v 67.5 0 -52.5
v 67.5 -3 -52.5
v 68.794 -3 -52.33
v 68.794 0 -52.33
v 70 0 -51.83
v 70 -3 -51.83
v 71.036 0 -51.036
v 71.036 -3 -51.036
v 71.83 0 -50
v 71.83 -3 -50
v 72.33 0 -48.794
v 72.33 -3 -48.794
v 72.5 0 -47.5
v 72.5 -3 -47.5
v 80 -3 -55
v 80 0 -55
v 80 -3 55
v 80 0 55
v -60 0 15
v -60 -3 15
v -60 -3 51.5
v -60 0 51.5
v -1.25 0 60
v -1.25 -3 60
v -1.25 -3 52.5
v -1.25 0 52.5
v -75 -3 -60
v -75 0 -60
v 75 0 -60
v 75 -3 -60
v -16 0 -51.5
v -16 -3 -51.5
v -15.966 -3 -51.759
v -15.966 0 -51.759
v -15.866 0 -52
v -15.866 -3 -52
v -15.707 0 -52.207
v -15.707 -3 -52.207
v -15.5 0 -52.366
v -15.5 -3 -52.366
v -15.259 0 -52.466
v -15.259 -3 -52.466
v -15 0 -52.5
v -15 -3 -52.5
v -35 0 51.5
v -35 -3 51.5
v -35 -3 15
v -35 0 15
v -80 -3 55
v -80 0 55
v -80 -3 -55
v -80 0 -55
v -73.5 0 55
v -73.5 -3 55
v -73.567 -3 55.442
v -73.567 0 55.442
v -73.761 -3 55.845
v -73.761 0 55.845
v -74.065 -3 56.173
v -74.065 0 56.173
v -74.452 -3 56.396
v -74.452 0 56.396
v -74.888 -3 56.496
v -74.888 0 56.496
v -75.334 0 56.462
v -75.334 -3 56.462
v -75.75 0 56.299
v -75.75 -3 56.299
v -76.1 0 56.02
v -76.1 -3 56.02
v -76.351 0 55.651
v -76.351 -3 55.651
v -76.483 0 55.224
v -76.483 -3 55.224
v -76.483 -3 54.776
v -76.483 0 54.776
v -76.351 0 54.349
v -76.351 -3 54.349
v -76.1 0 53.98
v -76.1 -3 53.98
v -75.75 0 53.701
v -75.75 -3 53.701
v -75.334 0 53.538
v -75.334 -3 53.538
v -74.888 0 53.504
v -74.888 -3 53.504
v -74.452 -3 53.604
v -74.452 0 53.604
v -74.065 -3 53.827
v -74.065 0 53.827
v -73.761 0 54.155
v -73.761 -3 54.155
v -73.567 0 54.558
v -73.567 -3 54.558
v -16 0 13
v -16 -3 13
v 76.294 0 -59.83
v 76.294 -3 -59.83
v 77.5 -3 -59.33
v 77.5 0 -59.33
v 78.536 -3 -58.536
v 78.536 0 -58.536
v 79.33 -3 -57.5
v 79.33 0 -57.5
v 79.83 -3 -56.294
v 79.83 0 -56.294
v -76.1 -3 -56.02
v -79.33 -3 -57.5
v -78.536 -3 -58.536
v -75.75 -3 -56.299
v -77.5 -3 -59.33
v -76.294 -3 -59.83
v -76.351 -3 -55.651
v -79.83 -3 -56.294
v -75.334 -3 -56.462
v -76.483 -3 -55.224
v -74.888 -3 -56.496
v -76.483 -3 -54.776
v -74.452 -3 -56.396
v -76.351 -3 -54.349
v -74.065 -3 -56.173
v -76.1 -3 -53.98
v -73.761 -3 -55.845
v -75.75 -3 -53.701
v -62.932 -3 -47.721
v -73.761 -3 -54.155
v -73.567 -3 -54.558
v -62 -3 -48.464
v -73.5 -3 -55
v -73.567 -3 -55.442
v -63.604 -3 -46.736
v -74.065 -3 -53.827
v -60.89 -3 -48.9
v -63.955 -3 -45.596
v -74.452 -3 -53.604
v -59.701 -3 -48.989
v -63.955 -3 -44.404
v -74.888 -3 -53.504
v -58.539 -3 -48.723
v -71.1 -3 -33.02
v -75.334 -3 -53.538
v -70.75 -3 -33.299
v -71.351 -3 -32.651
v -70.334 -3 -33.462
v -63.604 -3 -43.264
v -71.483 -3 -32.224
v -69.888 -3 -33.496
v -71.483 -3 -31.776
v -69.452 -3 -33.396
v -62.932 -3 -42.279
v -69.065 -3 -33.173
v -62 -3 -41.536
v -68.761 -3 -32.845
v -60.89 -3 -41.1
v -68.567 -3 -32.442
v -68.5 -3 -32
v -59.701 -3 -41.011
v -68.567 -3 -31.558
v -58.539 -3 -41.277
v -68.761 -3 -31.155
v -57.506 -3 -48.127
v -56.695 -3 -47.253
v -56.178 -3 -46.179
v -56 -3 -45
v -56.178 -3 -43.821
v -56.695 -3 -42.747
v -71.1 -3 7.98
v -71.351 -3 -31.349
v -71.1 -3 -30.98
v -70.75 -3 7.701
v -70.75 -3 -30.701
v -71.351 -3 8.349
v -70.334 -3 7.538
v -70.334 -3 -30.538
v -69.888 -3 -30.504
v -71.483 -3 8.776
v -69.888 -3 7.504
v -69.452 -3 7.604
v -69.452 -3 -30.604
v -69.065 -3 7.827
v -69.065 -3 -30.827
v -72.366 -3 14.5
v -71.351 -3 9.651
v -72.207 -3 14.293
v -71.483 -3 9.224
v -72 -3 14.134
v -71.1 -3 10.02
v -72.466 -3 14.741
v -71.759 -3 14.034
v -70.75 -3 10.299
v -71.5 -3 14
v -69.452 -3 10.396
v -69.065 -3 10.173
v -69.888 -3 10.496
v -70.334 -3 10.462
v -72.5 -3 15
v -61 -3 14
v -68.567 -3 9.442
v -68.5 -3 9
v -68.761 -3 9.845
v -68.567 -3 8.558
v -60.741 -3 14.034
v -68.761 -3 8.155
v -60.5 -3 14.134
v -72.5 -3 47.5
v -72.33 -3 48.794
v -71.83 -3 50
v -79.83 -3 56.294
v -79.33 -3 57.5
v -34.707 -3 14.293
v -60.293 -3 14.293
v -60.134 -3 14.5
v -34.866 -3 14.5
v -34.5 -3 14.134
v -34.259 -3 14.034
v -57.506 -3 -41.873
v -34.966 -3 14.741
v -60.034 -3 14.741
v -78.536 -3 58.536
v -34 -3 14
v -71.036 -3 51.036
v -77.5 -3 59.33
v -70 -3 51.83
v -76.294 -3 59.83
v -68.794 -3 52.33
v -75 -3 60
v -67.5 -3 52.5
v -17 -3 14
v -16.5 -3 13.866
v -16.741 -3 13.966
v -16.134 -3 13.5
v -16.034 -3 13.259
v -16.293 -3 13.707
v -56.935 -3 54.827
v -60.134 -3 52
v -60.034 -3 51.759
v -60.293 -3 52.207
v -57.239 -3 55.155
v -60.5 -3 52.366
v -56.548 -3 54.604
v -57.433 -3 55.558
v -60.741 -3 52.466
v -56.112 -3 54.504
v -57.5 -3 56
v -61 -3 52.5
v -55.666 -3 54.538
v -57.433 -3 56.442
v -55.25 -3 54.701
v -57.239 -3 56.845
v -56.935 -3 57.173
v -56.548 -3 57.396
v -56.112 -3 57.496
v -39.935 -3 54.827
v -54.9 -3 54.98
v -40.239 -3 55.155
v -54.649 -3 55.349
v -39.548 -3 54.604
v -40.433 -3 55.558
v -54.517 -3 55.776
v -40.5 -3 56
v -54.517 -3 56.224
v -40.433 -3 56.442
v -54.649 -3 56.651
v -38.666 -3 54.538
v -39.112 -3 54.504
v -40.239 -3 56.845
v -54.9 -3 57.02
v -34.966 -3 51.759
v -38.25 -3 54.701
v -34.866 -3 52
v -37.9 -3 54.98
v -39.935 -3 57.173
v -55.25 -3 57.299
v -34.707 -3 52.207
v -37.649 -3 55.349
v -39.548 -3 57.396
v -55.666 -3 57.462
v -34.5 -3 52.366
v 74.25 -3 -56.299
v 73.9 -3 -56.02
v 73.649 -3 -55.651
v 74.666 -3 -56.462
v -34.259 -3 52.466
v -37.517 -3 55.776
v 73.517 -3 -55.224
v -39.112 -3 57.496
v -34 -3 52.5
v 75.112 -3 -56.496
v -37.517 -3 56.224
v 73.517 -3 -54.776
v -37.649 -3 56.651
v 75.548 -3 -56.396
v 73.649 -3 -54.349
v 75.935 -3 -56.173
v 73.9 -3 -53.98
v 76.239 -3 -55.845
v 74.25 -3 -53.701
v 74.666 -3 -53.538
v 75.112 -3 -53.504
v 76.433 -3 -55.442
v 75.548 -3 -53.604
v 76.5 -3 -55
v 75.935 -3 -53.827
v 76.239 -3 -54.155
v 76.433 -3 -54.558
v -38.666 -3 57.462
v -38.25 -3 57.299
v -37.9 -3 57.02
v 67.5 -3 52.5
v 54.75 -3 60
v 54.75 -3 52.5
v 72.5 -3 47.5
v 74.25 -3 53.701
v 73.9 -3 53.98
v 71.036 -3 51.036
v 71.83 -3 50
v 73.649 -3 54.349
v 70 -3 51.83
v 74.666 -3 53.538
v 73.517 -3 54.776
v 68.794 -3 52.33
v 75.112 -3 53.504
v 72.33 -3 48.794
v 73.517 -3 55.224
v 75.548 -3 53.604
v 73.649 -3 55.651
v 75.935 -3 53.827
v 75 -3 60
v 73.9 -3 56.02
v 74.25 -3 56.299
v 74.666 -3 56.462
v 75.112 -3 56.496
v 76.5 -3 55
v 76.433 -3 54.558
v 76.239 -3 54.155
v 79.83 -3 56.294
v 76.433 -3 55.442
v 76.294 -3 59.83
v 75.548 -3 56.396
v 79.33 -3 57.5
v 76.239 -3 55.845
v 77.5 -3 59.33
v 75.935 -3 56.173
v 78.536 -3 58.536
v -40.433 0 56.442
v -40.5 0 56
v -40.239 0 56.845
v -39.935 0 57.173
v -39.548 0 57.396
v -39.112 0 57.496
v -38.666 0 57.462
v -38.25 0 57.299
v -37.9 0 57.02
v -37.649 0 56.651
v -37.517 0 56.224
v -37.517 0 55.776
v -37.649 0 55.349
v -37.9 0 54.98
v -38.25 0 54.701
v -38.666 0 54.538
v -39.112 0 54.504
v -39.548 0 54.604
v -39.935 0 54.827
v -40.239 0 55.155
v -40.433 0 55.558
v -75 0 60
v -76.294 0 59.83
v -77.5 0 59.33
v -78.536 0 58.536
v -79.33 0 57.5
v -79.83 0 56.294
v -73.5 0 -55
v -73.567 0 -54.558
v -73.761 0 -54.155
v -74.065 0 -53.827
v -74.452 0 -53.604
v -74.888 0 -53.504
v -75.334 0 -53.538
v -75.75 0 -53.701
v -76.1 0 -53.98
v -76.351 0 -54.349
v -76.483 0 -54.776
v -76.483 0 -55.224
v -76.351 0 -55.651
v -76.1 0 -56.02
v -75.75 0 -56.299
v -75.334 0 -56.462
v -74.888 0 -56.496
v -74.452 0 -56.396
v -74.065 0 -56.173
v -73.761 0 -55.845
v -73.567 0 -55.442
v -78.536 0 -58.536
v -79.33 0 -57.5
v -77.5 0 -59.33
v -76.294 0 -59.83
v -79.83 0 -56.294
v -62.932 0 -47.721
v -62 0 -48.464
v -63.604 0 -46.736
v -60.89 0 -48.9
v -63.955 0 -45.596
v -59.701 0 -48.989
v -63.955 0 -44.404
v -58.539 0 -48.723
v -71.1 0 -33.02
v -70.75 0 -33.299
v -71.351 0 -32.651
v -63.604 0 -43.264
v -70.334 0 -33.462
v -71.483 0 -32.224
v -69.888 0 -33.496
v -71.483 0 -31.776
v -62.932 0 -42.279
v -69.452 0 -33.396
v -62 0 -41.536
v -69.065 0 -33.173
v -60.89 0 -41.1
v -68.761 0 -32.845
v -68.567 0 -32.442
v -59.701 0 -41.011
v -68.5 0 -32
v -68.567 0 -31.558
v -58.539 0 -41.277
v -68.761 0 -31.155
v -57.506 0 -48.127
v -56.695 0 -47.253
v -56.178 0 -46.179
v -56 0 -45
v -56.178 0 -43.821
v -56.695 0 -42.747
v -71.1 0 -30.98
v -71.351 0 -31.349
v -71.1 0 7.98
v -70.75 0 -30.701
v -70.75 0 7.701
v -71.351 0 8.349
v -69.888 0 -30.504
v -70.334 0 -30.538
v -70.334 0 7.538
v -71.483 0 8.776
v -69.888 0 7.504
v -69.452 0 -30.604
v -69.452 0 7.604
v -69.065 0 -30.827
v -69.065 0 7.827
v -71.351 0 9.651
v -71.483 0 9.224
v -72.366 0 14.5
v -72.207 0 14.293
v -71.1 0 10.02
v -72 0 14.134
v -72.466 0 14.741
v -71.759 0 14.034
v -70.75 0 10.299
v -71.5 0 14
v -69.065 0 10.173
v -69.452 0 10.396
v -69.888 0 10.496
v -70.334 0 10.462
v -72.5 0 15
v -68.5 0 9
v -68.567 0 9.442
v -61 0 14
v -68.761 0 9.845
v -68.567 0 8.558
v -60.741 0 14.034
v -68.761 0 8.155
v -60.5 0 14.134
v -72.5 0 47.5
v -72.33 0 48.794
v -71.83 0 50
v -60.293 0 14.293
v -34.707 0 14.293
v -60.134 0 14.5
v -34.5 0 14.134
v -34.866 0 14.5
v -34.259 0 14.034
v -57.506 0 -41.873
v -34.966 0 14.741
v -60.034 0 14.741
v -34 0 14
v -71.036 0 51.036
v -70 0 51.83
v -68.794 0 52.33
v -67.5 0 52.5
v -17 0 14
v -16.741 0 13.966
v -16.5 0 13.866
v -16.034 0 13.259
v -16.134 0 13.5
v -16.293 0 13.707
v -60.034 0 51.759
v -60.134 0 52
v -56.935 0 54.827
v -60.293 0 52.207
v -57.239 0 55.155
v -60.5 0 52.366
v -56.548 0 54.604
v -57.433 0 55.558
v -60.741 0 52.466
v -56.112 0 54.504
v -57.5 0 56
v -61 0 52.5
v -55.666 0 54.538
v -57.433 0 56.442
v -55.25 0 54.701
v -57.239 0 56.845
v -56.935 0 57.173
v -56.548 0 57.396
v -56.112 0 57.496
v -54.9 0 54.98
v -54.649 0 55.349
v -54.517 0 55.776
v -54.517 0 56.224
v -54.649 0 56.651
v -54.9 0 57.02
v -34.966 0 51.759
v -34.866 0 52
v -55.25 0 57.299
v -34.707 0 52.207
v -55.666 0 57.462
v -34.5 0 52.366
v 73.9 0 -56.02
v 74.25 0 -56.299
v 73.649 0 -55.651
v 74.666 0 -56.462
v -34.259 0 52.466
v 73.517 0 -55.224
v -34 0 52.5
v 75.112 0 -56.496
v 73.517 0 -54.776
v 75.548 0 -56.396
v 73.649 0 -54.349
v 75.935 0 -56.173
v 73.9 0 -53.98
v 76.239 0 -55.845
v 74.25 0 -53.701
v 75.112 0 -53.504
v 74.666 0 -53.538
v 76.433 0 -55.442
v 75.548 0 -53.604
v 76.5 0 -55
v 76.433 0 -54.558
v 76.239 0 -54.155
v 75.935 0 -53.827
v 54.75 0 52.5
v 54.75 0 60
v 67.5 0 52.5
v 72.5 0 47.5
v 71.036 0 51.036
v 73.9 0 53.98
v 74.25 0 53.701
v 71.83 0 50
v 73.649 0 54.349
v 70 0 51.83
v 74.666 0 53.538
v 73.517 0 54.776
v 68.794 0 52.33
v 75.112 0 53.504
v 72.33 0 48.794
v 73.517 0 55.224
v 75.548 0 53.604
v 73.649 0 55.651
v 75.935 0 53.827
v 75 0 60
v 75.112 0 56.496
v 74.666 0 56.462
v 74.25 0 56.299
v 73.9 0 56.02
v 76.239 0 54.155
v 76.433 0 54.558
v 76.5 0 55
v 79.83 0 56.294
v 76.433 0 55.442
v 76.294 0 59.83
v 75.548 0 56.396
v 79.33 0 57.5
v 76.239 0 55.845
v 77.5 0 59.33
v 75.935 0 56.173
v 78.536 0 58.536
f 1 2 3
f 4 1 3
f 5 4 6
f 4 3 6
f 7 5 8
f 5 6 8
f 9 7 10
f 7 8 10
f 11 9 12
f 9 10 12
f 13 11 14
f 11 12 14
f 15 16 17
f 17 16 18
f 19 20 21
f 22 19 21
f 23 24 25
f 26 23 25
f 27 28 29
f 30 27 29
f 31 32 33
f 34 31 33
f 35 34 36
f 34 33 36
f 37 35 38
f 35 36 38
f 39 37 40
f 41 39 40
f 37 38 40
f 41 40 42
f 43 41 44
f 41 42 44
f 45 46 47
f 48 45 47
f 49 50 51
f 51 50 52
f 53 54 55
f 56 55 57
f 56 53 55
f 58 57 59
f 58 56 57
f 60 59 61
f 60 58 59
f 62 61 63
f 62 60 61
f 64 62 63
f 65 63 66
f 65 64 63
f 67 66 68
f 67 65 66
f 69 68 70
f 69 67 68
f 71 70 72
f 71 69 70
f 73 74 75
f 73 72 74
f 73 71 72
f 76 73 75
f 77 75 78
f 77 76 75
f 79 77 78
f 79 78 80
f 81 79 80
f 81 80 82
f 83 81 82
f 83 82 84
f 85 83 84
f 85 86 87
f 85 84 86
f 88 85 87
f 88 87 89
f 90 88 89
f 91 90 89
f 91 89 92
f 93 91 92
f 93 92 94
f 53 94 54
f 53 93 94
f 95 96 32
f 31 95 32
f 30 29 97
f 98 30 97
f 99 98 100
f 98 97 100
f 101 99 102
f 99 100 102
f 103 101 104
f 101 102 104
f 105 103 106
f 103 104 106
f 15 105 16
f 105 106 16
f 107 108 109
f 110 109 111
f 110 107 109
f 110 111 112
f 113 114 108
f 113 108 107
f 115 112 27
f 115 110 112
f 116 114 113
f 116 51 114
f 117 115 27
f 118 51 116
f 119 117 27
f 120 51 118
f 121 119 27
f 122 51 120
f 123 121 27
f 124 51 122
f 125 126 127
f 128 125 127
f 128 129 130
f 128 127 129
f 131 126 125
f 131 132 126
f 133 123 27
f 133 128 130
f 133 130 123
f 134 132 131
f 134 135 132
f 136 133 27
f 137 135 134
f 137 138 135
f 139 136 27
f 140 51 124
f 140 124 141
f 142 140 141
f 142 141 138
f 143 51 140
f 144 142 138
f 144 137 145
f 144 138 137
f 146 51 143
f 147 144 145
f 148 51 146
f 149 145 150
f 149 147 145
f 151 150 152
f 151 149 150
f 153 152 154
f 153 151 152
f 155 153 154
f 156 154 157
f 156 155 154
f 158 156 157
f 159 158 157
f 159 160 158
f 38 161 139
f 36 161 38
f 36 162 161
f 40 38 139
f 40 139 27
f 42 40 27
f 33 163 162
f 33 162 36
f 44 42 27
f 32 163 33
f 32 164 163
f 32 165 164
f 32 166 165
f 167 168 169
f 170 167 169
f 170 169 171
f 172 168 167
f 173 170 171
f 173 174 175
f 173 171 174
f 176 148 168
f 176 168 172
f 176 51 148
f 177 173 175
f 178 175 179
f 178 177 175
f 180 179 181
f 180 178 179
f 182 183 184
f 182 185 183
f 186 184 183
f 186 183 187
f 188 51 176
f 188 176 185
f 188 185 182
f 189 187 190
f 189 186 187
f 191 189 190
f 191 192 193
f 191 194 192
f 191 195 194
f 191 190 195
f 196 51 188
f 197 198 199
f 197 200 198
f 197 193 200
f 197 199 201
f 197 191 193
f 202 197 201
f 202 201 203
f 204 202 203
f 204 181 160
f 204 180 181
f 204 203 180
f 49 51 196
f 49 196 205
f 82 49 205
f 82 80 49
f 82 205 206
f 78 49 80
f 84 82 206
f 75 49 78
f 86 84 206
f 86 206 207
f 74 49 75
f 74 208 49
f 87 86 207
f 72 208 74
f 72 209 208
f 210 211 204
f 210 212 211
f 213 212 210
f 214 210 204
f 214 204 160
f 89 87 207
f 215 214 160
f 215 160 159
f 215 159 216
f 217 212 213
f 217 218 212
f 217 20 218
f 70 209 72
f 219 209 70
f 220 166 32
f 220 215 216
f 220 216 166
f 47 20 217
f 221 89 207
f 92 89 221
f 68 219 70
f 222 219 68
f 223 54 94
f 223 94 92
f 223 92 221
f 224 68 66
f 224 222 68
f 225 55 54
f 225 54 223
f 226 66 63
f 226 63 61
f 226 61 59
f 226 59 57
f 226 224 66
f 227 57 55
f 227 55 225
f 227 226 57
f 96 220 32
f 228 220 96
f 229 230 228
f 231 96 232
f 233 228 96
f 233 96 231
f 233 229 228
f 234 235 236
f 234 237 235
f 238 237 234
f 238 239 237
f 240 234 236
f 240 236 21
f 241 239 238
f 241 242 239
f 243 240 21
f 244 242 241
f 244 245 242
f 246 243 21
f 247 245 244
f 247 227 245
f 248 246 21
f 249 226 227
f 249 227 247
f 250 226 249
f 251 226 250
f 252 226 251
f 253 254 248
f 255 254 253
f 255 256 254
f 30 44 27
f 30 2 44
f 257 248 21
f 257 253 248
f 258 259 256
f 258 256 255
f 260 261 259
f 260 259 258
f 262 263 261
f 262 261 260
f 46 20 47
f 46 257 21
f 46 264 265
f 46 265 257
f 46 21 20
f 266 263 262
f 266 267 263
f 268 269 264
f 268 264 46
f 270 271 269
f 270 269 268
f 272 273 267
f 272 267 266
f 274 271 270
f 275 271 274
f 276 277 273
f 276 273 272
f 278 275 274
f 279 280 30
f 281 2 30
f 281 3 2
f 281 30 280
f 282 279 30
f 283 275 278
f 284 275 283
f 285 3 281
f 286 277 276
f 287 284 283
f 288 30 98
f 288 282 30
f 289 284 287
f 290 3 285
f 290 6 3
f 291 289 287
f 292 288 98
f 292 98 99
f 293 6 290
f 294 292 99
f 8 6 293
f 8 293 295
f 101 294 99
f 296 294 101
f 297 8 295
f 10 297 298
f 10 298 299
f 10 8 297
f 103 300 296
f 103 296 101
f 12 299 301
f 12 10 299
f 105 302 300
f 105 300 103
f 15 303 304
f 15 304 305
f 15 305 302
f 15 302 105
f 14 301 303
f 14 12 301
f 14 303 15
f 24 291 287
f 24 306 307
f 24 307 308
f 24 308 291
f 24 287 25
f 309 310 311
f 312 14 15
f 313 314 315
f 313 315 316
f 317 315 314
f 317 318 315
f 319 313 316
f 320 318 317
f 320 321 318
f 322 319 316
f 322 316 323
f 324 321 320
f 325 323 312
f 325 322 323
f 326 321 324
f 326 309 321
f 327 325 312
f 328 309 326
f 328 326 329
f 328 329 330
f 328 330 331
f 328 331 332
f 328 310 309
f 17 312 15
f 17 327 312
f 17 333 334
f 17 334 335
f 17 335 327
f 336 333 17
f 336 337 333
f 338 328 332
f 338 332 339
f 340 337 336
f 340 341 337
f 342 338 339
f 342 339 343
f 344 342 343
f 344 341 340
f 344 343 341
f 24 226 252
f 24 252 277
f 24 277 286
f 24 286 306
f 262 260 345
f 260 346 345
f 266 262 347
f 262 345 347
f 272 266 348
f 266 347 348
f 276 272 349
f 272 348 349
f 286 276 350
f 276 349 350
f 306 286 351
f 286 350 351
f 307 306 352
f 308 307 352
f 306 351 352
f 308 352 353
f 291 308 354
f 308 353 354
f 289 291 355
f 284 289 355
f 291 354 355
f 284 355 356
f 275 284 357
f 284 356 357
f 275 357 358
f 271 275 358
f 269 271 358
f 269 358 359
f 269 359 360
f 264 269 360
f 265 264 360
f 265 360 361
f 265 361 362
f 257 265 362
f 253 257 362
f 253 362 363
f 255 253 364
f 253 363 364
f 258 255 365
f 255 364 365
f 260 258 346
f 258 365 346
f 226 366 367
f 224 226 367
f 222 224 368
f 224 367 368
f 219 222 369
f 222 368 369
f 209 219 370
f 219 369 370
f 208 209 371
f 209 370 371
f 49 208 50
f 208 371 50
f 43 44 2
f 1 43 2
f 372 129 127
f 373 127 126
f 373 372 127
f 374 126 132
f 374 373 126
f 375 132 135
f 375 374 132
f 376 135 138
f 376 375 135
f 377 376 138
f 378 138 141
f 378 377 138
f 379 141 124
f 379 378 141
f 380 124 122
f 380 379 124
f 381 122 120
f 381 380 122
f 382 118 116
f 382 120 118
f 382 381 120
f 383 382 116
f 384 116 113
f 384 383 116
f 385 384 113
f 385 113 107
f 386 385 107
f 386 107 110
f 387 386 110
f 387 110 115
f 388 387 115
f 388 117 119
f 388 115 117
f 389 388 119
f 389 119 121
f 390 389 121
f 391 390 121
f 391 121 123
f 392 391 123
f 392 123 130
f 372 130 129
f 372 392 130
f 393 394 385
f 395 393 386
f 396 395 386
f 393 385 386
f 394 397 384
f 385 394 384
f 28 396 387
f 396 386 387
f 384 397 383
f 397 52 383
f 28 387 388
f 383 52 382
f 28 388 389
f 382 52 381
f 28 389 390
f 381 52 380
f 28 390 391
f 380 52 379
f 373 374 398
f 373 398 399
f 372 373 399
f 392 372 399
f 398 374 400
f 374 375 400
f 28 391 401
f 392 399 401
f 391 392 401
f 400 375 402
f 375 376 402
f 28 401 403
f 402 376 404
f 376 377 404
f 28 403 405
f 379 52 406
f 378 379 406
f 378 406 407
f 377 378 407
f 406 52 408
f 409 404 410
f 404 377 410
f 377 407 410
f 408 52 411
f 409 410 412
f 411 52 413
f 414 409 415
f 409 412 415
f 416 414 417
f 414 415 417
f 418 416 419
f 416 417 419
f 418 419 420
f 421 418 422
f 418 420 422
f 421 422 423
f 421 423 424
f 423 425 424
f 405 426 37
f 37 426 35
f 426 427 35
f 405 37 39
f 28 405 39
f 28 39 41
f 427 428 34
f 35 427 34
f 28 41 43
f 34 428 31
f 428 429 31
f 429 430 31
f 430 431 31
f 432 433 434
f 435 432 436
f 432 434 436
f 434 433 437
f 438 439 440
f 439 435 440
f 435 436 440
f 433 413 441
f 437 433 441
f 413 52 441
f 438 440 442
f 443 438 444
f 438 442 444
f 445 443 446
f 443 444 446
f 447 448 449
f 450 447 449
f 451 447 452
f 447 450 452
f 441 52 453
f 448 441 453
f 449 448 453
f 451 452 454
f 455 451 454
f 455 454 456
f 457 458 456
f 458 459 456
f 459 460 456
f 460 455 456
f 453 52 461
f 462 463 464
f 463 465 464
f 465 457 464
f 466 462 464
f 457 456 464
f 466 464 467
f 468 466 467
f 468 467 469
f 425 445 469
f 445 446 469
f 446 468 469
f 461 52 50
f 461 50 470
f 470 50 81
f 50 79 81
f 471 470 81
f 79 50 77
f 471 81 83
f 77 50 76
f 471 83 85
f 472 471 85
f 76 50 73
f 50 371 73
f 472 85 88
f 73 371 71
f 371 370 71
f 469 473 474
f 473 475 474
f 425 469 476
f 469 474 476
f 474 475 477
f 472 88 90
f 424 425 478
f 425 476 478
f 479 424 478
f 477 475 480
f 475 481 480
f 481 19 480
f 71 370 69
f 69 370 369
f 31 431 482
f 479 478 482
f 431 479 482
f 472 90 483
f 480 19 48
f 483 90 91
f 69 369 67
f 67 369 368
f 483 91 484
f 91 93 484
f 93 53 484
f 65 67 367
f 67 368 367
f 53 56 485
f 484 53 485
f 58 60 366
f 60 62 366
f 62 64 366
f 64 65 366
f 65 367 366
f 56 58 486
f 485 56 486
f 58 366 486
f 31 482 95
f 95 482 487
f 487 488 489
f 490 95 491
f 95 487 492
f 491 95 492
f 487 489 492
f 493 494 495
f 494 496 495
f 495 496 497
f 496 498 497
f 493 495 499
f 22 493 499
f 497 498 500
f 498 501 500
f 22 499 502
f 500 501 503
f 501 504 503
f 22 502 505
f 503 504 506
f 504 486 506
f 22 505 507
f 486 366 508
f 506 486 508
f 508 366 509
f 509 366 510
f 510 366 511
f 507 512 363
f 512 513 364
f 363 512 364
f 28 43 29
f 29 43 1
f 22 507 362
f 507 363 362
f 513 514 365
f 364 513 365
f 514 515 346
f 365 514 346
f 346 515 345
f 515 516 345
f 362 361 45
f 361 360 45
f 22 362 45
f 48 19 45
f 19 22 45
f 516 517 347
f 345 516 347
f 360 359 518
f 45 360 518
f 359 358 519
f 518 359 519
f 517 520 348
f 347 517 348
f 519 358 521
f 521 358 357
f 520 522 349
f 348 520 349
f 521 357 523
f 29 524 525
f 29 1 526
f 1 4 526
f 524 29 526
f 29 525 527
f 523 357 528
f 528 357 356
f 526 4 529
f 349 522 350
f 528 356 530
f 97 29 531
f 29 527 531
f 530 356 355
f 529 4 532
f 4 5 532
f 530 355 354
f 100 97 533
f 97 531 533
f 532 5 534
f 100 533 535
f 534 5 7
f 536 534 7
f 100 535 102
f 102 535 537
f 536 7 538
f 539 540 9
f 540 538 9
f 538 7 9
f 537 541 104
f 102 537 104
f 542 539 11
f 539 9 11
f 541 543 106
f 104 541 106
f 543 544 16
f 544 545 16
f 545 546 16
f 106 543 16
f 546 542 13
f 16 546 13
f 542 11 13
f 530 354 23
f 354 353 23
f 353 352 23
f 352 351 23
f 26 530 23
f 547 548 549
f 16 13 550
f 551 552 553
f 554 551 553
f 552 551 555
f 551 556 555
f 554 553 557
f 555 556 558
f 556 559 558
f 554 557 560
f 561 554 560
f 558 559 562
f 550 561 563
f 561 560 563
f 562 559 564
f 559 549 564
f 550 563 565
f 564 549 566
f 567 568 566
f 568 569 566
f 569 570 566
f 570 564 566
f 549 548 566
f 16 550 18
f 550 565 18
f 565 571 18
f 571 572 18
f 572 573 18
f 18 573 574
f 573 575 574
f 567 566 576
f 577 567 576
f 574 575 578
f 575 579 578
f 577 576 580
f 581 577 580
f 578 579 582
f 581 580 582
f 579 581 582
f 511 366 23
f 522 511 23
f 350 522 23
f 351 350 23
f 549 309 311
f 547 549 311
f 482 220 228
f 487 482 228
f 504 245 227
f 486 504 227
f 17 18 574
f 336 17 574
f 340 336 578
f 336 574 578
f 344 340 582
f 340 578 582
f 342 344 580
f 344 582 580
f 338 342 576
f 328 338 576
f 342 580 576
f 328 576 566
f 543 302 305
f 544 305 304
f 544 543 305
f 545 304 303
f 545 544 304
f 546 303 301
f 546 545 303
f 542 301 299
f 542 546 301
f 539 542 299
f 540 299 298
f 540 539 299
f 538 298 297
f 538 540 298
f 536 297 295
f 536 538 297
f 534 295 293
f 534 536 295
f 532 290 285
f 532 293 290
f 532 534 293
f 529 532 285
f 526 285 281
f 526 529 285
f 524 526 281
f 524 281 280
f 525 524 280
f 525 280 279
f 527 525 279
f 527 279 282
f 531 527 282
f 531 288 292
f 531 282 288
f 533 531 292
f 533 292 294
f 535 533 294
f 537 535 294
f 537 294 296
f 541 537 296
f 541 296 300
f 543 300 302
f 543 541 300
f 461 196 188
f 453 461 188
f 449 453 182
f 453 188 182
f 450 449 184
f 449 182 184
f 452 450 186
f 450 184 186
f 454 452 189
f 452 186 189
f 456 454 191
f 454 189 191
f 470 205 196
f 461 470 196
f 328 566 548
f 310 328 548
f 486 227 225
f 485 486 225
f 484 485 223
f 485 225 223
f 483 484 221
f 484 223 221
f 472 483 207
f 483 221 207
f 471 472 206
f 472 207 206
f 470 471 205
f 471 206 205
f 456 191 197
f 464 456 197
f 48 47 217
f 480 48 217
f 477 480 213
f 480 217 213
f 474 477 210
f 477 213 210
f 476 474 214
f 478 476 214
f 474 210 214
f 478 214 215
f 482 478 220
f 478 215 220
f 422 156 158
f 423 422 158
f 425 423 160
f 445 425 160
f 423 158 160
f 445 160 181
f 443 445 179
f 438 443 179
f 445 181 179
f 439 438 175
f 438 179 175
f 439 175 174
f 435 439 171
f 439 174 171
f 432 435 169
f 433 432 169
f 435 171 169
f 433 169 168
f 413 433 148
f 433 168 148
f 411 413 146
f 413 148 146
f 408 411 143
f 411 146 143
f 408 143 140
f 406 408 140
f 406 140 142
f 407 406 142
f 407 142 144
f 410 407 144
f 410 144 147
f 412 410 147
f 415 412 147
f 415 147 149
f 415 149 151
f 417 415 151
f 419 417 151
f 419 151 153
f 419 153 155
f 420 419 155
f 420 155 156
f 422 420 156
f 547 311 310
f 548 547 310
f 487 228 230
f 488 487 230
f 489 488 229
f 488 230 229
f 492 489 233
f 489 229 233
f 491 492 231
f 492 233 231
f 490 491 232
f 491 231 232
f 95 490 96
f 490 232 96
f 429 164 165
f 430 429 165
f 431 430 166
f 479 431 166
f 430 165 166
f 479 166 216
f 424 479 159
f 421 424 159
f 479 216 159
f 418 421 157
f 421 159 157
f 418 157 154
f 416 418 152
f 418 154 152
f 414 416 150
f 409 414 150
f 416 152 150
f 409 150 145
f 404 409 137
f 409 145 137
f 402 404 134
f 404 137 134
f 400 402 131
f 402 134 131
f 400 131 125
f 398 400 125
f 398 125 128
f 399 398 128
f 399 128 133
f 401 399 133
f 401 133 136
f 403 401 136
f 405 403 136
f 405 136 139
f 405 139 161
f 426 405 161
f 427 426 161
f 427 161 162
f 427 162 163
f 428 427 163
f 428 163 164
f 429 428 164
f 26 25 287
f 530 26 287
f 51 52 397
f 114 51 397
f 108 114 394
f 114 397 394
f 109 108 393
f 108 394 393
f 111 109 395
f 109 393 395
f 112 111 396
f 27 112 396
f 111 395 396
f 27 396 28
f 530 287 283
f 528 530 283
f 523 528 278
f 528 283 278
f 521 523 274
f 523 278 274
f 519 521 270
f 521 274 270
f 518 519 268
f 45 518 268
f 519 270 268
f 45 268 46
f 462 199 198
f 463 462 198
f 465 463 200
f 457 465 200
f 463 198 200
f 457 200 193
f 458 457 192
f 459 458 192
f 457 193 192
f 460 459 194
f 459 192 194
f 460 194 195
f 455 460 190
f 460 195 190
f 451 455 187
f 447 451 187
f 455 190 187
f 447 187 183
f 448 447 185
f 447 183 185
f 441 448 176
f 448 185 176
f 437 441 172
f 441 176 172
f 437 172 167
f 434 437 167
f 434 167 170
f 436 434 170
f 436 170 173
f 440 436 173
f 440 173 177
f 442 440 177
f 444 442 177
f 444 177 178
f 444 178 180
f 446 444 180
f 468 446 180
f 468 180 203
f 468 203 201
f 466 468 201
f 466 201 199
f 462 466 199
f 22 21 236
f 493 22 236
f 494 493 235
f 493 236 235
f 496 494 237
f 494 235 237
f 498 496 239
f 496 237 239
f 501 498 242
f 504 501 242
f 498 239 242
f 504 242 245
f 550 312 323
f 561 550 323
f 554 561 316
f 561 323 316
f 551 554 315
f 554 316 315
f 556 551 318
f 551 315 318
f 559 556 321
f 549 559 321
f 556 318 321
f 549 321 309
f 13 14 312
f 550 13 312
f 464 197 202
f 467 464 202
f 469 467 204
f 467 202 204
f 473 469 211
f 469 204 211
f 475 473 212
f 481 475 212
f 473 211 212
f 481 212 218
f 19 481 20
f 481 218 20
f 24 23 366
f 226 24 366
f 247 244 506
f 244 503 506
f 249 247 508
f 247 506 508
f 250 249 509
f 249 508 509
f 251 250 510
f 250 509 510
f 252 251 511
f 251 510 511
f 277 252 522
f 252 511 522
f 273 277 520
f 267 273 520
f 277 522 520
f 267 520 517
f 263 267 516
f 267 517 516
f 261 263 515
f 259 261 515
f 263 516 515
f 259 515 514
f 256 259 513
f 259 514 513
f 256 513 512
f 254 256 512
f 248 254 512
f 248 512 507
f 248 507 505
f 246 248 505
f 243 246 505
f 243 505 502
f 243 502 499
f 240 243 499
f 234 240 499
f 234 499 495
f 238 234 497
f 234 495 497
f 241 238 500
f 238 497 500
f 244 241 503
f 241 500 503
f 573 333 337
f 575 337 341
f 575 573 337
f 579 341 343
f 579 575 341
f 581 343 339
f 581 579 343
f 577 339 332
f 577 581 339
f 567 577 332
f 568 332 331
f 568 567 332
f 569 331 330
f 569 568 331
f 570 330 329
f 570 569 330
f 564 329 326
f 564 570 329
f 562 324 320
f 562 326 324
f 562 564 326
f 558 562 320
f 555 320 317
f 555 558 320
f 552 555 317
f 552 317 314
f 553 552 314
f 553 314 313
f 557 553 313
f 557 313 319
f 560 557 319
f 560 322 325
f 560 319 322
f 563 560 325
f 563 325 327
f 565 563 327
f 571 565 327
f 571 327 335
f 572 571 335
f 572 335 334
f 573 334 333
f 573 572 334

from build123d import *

# Parameters (mm, degrees)
F1_DEPTH  = 3
F2_R      = 1.5
F3_DEPTH  = 25
F5_DEPTH  = 3
F7_D      = 3
F7_DEPTH  = 3
F7_TIP    = 0.9012909285
F8_DEPTH  = 3
F9_R      = 1.5
F9_R_2    = 4
F10_DEPTH = 25


# Not quite as in the source:
# - a feature names something its author has since deleted; it is built from what else it names


with BuildPart() as f1:
    # F0 (on Front) → F1 (new body)
    with BuildSketch(Plane.XZ):
        with BuildLine():
            Line((-75, -60), (75, -60))
            ThreePointArc((75, -60), (78.5355339059, -58.5355339059), (80, -55))
            Line((80, -55), (80, 55))
            ThreePointArc((80, 55), (78.5355339059, 58.5355339059), (75, 60))
            Line((75, 60), (-75, 60))
            ThreePointArc((-75, 60), (-78.5355339059, 58.5355339059), (-80, 55))
            Line((-80, 55), (-80, -55))
            ThreePointArc((-80, -55), (-78.5355339059, -58.5355339059), (-75, -60))
        make_face()
    extrude(amount=F1_DEPTH)

    # F2 (on Front) → F3 (cut)
    with BuildSketch(Plane.XZ):
        with Locations((-75, 55)):
            Circle(F2_R)
        with Locations((75, 55)):
            Circle(F2_R)
        with Locations((75, -55)):
            Circle(F2_R)
        with Locations((-75, -55)):
            Circle(F2_R)
    extrude(amount=F3_DEPTH, mode=Mode.SUBTRACT)

    # F4 (on face) → F5 (cut)
    with BuildSketch(Plane.XZ.offset(3)):
        with BuildLine():
            ThreePointArc((72.5, 47.5), (71.0355339059, 51.0355339059), (67.5, 52.5))
            Line((67.5, 52.5), (54.75, 52.5))
            Line((54.75, 52.5), (54.75, 60))
            Line((54.75, 60), (-1.25, 60))
            Line((-1.25, 60), (-1.25, 52.5))
            Line((-1.25, 52.5), (-34, 52.5))
            ThreePointArc((-34, 52.5), (-34.7071067812, 52.2071067812), (-35, 51.5))
            Line((-35, 51.5), (-35, 15))
            ThreePointArc((-35, 15), (-34.7071067812, 14.2928932188), (-34, 14))
            Line((-34, 14), (-17, 14))
            ThreePointArc((-17, 14), (-16.2928932188, 13.7071067812), (-16, 13))
            Line((-16, 13), (-16, -51.5))
            ThreePointArc((-16, -51.5), (-15.7071067812, -52.2071067812), (-15, -52.5))
            Line((-15, -52.5), (67.5, -52.5))
            ThreePointArc((67.5, -52.5), (71.0355339059, -51.0355339059), (72.5, -47.5))
            Line((72.5, -47.5), (72.5, 47.5))
        make_face()
    extrude(amount=-F5_DEPTH, mode=Mode.SUBTRACT)

    # F7
    with Locations(Plane.XZ.offset(3)):
        with Locations((-56, 56), (-39, 56)):
            Hole(F7_D / 2, depth=F7_DEPTH)
            with Locations((0, 0, -(F7_DEPTH + F7_TIP / 2))):  # 118° drill point
                Cone(0, F7_D / 2, F7_TIP, mode=Mode.SUBTRACT)

    # F4 (on face) → F8 (cut)
    with BuildSketch(Plane.XZ.offset(3)):
        with BuildLine():
            ThreePointArc((72.5, 47.5), (71.0355339059, 51.0355339059), (67.5, 52.5))
            Line((67.5, 52.5), (54.75, 52.5))
            Line((54.75, 52.5), (54.75, 60))
            Line((54.75, 60), (-1.25, 60))
            Line((-1.25, 60), (-1.25, 52.5))
            Line((-1.25, 52.5), (-34, 52.5))
            ThreePointArc((-34, 52.5), (-34.7071067812, 52.2071067812), (-35, 51.5))
            Line((-35, 51.5), (-35, 15))
            ThreePointArc((-35, 15), (-34.7071067812, 14.2928932188), (-34, 14))
            Line((-34, 14), (-17, 14))
            ThreePointArc((-17, 14), (-16.2928932188, 13.7071067812), (-16, 13))
            Line((-16, 13), (-16, -51.5))
            ThreePointArc((-16, -51.5), (-15.7071067812, -52.2071067812), (-15, -52.5))
            Line((-15, -52.5), (67.5, -52.5))
            ThreePointArc((67.5, -52.5), (71.0355339059, -51.0355339059), (72.5, -47.5))
            Line((72.5, -47.5), (72.5, 47.5))
        make_face()
        with BuildLine():
            ThreePointArc((-67.5, 52.5), (-71.0355339059, 51.0355339059), (-72.5, 47.5))
            Line((-72.5, 47.5), (-72.5, 15))
            ThreePointArc((-72.5, 15), (-72.2071067812, 14.2928932188), (-71.5, 14))
            Line((-71.5, 14), (-61, 14))
            ThreePointArc((-61, 14), (-60.2928932188, 14.2928932188), (-60, 15))
            Line((-60, 15), (-60, 51.5))
            ThreePointArc((-60, 51.5), (-60.2928932188, 52.2071067812), (-61, 52.5))
            Line((-61, 52.5), (-67.5, 52.5))
        make_face()
    extrude(amount=-F8_DEPTH, mode=Mode.SUBTRACT)

    # F9 (on face) → F10 (cut)
    with BuildSketch(Plane.XZ.offset(3)):
        with Locations((-70, 9)):
            Circle(F9_R)
        with Locations((-60, -45)):
            Circle(F9_R_2)
        with Locations((-70, -32)):
            Circle(F9_R)
    extrude(amount=-F10_DEPTH, mode=Mode.SUBTRACT)


solid = f1.part
